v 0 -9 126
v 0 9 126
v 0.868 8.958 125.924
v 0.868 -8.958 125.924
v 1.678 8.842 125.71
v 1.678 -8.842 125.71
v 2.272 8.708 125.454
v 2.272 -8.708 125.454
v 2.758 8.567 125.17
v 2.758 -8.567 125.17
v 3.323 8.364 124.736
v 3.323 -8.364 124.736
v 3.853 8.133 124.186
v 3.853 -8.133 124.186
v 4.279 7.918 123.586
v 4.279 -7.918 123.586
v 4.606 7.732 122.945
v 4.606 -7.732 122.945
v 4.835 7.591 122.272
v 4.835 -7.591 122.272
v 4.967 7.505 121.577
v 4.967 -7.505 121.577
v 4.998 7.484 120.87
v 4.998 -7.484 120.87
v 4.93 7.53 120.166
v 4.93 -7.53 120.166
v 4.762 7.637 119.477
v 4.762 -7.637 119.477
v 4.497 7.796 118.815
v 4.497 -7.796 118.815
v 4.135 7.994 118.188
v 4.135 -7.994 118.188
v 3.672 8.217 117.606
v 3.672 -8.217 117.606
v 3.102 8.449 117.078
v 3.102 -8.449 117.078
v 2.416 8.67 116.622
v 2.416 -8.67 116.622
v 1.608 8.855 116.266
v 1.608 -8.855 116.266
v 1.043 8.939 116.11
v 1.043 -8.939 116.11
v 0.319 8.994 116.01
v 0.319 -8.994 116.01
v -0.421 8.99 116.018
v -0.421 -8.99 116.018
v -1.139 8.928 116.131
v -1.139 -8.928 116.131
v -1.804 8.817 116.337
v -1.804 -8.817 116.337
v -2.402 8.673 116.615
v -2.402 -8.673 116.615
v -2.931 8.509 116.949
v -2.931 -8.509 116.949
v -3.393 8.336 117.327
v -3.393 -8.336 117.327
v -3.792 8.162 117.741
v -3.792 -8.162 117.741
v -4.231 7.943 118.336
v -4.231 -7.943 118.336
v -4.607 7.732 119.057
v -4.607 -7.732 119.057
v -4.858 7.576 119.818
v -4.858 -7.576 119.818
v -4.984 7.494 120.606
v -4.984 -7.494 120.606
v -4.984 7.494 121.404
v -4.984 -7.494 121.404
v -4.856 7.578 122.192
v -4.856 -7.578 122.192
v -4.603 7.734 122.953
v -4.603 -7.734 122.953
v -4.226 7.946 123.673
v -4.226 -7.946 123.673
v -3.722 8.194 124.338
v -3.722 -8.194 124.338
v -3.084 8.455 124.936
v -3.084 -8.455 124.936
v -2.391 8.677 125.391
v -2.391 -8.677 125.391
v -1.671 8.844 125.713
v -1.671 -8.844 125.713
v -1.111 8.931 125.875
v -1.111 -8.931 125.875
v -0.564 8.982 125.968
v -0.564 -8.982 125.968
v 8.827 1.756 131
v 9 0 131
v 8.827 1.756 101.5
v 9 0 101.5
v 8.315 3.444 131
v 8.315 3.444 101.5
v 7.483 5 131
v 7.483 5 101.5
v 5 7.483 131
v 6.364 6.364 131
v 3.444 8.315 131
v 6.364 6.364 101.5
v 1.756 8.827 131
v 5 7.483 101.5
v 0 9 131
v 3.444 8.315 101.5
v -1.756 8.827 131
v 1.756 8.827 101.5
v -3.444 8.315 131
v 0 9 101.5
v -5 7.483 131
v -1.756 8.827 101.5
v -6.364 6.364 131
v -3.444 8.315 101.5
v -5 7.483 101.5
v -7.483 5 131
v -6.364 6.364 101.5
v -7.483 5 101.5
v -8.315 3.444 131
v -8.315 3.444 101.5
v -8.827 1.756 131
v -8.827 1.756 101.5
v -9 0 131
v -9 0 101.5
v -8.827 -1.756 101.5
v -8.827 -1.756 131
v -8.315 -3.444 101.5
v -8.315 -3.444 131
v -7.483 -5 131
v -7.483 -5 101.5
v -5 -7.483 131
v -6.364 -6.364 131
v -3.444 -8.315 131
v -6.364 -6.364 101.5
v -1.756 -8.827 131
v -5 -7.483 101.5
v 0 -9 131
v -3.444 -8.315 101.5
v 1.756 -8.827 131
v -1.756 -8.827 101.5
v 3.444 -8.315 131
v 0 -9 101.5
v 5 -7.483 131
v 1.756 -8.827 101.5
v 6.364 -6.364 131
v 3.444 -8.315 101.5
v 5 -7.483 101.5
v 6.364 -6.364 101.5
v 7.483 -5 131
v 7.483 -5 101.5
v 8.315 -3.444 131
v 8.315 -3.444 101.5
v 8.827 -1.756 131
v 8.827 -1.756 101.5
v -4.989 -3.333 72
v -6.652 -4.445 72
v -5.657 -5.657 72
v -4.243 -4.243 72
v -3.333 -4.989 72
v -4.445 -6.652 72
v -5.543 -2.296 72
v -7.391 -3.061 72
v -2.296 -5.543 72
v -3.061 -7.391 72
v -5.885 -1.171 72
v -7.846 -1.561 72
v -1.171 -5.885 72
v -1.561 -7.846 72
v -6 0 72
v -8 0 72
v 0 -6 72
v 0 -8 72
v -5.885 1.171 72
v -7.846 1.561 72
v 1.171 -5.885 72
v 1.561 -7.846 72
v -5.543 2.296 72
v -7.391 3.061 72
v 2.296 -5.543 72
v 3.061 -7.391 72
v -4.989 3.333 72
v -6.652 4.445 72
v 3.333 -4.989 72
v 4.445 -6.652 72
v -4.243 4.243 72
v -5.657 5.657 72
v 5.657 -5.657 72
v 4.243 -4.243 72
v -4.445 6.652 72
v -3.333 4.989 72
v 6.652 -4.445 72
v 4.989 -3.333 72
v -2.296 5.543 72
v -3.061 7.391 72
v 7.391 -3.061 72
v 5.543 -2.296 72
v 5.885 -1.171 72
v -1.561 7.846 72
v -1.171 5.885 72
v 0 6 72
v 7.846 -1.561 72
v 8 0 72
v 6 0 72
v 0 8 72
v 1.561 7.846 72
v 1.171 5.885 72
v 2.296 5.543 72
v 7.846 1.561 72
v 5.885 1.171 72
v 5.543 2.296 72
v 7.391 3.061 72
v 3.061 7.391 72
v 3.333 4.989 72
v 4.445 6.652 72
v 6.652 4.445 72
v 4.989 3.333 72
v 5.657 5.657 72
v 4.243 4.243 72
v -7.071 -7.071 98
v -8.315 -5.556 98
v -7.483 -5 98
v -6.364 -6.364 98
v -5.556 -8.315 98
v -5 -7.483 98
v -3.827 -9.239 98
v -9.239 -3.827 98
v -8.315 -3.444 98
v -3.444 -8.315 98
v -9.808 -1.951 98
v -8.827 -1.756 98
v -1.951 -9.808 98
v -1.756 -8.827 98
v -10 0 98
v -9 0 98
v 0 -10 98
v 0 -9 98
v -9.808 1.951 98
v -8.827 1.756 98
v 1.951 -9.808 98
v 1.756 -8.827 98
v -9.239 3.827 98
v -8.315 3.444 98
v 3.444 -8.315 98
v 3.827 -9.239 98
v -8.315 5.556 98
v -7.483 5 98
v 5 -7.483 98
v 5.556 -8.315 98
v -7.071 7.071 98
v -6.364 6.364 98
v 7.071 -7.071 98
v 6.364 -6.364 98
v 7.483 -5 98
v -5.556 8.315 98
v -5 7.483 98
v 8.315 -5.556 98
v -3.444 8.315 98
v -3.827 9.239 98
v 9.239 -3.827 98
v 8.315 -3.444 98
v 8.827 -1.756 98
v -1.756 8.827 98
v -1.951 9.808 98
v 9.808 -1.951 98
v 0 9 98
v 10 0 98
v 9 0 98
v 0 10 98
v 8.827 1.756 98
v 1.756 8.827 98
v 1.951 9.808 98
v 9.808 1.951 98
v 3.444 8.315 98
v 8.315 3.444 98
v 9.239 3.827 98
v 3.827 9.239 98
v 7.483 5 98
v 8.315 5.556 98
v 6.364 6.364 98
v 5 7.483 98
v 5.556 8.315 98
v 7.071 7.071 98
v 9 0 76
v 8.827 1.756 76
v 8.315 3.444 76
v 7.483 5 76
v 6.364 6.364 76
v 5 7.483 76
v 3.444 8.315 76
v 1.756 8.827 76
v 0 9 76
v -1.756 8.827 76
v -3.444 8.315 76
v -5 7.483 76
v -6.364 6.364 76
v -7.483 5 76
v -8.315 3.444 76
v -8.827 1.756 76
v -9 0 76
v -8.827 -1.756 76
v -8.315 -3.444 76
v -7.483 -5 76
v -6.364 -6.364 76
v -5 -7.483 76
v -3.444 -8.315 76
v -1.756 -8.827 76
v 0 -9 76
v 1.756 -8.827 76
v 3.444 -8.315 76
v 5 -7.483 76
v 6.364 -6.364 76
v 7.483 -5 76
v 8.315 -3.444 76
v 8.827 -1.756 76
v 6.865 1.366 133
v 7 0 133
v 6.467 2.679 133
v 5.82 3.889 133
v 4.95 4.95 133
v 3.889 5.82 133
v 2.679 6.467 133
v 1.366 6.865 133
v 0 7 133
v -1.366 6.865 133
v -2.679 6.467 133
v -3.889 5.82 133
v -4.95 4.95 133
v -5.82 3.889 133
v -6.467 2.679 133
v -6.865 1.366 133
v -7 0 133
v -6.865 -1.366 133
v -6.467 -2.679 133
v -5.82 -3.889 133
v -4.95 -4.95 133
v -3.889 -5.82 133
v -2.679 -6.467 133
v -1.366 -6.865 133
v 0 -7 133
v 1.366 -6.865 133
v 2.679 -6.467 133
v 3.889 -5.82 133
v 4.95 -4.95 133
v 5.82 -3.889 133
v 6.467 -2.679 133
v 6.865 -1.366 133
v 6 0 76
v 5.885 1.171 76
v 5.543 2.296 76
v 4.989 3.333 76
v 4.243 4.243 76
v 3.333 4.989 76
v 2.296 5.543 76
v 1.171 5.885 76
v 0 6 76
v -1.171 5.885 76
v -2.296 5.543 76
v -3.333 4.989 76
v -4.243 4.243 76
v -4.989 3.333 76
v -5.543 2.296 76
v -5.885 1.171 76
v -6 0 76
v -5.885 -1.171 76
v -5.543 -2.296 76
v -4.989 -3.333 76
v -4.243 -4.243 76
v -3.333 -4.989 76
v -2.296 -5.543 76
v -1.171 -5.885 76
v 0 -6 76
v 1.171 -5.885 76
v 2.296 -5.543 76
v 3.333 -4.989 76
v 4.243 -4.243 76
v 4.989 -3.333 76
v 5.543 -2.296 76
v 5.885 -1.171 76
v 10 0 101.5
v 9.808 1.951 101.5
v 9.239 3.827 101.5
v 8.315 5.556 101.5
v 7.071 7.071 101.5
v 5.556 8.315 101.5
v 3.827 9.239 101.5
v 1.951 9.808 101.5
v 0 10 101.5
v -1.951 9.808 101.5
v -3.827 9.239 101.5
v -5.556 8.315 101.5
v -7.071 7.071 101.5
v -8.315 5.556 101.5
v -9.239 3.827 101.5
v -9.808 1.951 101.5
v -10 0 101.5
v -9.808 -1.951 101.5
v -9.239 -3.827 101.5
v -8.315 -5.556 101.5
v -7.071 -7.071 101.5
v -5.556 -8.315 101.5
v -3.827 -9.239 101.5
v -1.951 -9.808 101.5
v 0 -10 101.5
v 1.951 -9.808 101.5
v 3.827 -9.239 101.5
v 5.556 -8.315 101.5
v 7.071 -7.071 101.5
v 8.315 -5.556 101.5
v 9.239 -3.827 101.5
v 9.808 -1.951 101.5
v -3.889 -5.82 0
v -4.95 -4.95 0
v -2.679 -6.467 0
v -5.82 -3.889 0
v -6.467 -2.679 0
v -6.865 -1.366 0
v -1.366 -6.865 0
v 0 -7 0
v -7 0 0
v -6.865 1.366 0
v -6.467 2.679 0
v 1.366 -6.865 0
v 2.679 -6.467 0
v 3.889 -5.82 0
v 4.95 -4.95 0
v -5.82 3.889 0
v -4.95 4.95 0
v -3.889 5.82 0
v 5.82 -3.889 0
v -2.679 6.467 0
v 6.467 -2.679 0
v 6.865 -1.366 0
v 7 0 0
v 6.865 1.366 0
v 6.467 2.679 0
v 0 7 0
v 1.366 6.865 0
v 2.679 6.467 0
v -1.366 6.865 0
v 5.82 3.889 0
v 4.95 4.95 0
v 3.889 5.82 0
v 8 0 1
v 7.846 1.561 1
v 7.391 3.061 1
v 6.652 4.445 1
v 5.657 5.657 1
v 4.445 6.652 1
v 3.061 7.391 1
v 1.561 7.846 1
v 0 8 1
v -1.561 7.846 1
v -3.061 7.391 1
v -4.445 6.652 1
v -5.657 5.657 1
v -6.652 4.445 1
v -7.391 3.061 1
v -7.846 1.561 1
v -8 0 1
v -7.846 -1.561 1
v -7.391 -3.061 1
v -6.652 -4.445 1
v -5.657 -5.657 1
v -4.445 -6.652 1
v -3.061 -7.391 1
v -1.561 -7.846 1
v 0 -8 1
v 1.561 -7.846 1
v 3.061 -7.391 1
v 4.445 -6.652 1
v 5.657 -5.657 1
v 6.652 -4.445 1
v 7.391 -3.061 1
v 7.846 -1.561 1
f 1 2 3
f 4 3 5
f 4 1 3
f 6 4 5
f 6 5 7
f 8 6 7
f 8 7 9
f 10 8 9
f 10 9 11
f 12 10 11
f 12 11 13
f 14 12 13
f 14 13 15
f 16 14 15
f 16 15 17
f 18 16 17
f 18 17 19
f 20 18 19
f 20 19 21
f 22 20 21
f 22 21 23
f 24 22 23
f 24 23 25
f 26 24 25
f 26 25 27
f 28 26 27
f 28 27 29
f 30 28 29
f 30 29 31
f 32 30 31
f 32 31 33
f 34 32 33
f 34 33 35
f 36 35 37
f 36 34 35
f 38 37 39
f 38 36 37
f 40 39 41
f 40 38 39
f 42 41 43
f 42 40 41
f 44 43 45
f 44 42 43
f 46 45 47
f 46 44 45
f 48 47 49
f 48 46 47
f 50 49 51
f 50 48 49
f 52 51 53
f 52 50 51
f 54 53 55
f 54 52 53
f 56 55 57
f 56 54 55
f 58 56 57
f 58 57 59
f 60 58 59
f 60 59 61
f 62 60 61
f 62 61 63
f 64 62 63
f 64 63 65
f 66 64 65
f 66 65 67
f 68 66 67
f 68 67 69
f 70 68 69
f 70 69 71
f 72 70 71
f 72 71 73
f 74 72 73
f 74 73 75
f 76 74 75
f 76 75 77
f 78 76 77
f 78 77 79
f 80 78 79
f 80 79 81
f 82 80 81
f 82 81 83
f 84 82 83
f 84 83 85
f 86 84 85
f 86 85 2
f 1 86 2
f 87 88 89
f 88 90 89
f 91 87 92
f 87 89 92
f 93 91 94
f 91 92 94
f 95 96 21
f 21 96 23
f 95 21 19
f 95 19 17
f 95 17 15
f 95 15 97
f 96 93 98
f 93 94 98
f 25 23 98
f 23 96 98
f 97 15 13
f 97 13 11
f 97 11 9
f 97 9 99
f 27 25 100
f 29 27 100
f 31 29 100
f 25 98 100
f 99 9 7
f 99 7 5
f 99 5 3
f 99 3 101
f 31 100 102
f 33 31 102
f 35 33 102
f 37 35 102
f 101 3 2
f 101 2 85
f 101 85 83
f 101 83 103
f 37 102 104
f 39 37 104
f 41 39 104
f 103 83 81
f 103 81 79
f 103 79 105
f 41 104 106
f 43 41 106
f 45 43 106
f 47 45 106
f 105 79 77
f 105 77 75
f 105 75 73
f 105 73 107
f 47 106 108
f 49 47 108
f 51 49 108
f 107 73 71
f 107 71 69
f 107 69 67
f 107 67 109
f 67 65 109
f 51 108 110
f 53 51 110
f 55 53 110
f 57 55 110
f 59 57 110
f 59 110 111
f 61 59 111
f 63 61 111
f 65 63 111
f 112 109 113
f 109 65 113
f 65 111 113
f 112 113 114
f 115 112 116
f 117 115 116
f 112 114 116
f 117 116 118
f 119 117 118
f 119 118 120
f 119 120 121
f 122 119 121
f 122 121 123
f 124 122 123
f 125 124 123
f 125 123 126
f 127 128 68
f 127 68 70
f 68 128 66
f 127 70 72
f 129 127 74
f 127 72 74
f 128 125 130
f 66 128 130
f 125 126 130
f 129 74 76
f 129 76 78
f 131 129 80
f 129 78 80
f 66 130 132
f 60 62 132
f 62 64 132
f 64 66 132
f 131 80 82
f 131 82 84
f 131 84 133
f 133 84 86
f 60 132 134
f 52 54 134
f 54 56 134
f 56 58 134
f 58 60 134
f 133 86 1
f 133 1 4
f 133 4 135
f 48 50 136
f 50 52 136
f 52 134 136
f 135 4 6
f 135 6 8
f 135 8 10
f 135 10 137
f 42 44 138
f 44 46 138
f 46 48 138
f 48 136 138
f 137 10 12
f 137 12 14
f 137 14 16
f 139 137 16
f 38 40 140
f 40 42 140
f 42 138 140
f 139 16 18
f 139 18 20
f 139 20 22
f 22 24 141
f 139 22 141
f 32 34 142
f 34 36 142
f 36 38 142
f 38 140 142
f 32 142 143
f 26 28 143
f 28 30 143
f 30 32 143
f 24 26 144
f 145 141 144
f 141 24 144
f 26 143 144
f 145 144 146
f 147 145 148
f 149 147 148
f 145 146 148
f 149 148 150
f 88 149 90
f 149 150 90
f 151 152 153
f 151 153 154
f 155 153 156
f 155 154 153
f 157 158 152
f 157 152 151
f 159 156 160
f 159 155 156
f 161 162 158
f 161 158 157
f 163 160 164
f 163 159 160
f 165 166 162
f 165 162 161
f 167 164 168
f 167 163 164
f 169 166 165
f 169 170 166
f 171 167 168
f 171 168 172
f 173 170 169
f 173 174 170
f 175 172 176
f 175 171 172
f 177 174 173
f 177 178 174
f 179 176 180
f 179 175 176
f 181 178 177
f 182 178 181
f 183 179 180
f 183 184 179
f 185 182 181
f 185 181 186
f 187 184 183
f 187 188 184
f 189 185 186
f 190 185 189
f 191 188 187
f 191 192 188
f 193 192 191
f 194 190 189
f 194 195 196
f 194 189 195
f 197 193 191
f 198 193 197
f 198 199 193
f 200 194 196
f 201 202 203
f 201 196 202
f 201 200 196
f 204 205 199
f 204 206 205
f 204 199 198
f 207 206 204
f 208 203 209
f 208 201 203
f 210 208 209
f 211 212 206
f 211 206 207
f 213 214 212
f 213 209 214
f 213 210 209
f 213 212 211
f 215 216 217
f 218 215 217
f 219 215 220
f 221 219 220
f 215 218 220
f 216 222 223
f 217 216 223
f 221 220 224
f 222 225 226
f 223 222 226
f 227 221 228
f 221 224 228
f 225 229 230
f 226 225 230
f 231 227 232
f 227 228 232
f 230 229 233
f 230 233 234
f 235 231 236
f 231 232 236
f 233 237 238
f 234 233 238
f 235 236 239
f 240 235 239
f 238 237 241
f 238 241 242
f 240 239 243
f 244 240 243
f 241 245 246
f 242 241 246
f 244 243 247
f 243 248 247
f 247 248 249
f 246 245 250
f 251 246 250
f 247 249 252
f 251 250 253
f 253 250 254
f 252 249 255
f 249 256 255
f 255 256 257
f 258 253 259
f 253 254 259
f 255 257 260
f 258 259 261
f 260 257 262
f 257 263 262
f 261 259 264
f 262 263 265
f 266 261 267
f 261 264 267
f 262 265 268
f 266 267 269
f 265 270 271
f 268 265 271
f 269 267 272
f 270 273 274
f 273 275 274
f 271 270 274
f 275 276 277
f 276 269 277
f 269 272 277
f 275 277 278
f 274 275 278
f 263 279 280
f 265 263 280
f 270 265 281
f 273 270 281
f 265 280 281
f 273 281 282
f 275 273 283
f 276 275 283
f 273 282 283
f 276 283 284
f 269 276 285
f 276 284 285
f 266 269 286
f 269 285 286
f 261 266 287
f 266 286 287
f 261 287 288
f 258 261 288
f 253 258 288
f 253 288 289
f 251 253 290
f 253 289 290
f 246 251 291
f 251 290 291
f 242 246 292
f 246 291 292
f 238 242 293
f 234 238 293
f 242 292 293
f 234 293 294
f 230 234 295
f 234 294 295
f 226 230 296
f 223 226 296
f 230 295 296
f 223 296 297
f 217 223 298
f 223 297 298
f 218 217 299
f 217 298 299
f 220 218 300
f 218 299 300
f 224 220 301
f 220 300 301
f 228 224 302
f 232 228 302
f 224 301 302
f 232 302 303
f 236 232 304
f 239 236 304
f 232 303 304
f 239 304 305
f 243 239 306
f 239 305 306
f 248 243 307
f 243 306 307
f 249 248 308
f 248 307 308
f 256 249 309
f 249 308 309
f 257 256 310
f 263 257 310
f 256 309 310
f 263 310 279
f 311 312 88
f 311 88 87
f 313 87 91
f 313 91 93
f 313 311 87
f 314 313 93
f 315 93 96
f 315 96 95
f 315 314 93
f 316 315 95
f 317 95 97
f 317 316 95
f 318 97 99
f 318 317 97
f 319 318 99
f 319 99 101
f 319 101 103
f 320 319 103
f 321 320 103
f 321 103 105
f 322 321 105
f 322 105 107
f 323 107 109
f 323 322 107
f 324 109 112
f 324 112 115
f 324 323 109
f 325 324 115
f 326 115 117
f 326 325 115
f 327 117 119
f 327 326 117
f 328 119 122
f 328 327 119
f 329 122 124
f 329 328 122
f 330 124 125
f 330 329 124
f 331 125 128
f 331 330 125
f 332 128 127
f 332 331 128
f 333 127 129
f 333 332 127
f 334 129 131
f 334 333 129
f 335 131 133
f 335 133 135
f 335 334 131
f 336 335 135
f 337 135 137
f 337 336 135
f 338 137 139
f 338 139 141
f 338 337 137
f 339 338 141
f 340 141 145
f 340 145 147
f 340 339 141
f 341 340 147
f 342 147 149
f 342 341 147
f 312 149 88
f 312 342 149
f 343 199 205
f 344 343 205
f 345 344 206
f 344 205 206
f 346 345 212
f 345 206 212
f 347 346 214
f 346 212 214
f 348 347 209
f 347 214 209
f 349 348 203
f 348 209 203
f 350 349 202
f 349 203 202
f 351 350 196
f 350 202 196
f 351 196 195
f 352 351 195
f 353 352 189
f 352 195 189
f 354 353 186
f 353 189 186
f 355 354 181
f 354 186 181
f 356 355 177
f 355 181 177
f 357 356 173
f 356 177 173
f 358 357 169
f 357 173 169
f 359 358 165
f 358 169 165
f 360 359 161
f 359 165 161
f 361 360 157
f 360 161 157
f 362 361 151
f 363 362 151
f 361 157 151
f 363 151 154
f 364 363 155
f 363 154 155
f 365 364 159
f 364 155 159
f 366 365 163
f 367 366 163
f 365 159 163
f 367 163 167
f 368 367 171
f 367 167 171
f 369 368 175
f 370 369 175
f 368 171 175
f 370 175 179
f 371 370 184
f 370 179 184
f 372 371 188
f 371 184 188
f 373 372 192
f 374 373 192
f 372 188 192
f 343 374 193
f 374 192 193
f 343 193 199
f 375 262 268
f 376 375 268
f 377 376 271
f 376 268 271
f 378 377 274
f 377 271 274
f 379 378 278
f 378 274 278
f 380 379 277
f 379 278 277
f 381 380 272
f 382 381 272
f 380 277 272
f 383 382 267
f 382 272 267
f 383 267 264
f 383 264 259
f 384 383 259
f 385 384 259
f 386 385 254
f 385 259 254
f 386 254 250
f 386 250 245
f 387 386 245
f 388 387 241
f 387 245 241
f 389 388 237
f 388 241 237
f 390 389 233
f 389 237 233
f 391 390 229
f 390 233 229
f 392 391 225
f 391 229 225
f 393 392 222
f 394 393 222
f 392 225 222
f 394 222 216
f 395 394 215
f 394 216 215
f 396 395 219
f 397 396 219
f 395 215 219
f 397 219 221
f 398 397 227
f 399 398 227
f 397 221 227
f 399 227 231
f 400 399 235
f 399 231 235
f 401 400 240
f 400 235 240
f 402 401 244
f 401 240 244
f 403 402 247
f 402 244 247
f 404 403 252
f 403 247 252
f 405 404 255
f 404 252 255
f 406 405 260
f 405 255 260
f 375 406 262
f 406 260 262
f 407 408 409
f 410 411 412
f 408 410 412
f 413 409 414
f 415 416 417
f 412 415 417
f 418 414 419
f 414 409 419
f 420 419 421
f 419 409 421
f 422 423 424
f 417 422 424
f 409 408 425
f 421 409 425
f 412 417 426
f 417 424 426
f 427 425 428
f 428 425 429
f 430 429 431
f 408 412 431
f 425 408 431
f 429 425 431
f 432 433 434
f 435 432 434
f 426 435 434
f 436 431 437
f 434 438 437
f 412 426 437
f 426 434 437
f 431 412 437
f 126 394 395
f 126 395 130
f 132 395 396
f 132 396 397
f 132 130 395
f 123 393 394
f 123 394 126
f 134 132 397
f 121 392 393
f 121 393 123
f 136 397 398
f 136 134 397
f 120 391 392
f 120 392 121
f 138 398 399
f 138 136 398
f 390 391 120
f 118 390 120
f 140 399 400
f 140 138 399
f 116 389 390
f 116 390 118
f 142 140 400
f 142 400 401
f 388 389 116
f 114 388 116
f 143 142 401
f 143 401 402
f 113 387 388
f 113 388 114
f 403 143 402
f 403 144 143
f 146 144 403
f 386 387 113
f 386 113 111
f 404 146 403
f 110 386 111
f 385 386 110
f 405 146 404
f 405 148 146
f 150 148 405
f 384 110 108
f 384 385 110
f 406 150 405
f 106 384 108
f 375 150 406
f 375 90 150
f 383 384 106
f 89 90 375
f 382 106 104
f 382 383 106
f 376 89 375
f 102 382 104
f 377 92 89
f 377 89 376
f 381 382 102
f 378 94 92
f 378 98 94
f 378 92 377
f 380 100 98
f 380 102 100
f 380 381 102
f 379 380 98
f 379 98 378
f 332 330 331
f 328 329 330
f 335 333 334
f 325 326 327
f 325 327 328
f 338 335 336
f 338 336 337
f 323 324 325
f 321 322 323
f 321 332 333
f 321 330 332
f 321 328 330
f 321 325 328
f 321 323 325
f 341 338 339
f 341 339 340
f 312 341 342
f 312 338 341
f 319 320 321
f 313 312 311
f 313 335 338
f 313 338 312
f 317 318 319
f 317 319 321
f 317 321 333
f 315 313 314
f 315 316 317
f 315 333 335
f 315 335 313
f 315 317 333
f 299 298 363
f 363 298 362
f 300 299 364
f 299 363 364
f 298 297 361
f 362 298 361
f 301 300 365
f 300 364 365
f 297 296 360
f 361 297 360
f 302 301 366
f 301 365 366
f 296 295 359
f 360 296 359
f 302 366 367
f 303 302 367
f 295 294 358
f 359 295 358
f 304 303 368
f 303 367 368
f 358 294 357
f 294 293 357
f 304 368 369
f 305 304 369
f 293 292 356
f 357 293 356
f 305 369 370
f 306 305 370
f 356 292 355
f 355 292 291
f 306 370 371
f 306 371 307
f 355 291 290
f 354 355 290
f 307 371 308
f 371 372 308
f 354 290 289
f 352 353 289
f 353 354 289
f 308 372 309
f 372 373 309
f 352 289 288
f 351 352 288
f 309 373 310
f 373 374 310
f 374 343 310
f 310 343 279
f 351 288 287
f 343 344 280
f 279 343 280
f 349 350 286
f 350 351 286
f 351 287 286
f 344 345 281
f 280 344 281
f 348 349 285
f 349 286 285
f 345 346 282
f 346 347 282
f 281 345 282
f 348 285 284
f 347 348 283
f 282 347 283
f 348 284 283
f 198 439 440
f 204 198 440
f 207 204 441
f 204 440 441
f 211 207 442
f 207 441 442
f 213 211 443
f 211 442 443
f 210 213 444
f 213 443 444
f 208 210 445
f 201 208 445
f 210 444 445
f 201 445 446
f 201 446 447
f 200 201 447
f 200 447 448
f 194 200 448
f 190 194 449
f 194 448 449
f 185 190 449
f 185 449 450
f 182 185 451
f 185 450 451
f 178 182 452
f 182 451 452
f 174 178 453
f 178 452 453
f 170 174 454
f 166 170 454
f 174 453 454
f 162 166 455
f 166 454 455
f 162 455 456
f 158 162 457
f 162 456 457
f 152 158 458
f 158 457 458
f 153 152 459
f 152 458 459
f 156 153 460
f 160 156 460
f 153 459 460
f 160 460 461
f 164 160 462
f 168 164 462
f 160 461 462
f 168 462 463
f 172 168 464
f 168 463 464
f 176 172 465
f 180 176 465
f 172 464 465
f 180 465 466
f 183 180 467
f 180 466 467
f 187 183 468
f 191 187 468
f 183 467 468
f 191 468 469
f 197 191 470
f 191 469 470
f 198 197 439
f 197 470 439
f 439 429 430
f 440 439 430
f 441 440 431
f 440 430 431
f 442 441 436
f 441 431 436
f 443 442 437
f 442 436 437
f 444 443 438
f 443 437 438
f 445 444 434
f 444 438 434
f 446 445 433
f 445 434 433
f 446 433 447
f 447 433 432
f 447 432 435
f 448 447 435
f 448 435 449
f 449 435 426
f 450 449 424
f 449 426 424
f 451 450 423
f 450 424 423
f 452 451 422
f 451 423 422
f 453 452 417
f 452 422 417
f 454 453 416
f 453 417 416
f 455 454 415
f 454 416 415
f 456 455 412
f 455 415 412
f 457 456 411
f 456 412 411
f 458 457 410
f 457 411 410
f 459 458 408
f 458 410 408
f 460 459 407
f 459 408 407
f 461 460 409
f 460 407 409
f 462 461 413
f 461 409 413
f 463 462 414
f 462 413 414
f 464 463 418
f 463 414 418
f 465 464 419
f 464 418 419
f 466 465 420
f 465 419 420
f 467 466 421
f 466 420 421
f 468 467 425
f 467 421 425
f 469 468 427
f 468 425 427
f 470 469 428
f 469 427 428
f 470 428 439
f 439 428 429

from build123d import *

# Parameters (mm, degrees)
ESQUISSE2_R                  = 8
BOSS_EXTRU_1_DEPTH           = 72
ESQUISSE3_R                  = 6
BOSS_EXTRU_2_DEPTH           = 4
ESQUISSE4_R                  = 9
BOSS_EXTRU_3_DEPTH           = 22
ESQUISSE5_R                  = 10
BOSS_EXTRU_4_DEPTH           = 3.5
ESQUISSE6_R                  = 9
BOSS_EXTRU_5_DEPTH           = 31.5
CHANFREIN1_SIZE              = 2
CHANFREIN2_SIZE              = 1
ENL_V_MAT_EXTRU_1_DEPTH      = 134.749766355
ENL_V_MAT_EXTRU_1_DEPTH_BACK = 134.749766355
ESQUISSE7_R                  = 5


with BuildPart() as part:
    # Esquisse2 → Boss.-Extru.1 (new body)
    with BuildSketch(Plane.XY):
        Circle(ESQUISSE2_R)
    extrude(amount=BOSS_EXTRU_1_DEPTH)

    # Esquisse3 → Boss.-Extru.2 (add)
    with BuildSketch(Plane.XY.offset(72)):
        Circle(ESQUISSE3_R)
    extrude(amount=BOSS_EXTRU_2_DEPTH)

    # Esquisse4 → Boss.-Extru.3 (add)
    with BuildSketch(Plane.XY.offset(76)):
        Circle(ESQUISSE4_R)
    extrude(amount=BOSS_EXTRU_3_DEPTH)

    # Esquisse5 → Boss.-Extru.4 (add)
    with BuildSketch(Plane.XY.offset(98)):
        Circle(ESQUISSE5_R)
    extrude(amount=BOSS_EXTRU_4_DEPTH)

    # Esquisse6 → Boss.-Extru.5 (add)
    with BuildSketch(Plane.XY.offset(101.5)):
        Circle(ESQUISSE6_R)
    extrude(amount=BOSS_EXTRU_5_DEPTH)

    # Chanfrein1
    chanfrein1_edges = [part.edges().sort_by_distance(p)[0] for p in [
        (-9, 0, 133),
    ]]
    chamfer(chanfrein1_edges, length=CHANFREIN1_SIZE)

    # Chanfrein2
    chanfrein2_edges = [part.edges().sort_by_distance(p)[0] for p in [
        (-8, 0, 0),
    ]]
    chamfer(chanfrein2_edges, length=CHANFREIN2_SIZE)

    # Esquisse7 → Enlèv. mat.-Extru.1 (cut, two sides: drawn at the far end of the back side and taken through both)
    with BuildSketch(Plane(origin=(0, 0, 0), x_dir=(1, 0, 0), z_dir=(0, 1, 0)).offset(-ENL_V_MAT_EXTRU_1_DEPTH_BACK)):
        with Locations(Location((0, -121, 0), (0, 0, 270))):
            Circle(ESQUISSE7_R)
    extrude(amount=ENL_V_MAT_EXTRU_1_DEPTH + ENL_V_MAT_EXTRU_1_DEPTH_BACK, mode=Mode.SUBTRACT)


solid = part.part
